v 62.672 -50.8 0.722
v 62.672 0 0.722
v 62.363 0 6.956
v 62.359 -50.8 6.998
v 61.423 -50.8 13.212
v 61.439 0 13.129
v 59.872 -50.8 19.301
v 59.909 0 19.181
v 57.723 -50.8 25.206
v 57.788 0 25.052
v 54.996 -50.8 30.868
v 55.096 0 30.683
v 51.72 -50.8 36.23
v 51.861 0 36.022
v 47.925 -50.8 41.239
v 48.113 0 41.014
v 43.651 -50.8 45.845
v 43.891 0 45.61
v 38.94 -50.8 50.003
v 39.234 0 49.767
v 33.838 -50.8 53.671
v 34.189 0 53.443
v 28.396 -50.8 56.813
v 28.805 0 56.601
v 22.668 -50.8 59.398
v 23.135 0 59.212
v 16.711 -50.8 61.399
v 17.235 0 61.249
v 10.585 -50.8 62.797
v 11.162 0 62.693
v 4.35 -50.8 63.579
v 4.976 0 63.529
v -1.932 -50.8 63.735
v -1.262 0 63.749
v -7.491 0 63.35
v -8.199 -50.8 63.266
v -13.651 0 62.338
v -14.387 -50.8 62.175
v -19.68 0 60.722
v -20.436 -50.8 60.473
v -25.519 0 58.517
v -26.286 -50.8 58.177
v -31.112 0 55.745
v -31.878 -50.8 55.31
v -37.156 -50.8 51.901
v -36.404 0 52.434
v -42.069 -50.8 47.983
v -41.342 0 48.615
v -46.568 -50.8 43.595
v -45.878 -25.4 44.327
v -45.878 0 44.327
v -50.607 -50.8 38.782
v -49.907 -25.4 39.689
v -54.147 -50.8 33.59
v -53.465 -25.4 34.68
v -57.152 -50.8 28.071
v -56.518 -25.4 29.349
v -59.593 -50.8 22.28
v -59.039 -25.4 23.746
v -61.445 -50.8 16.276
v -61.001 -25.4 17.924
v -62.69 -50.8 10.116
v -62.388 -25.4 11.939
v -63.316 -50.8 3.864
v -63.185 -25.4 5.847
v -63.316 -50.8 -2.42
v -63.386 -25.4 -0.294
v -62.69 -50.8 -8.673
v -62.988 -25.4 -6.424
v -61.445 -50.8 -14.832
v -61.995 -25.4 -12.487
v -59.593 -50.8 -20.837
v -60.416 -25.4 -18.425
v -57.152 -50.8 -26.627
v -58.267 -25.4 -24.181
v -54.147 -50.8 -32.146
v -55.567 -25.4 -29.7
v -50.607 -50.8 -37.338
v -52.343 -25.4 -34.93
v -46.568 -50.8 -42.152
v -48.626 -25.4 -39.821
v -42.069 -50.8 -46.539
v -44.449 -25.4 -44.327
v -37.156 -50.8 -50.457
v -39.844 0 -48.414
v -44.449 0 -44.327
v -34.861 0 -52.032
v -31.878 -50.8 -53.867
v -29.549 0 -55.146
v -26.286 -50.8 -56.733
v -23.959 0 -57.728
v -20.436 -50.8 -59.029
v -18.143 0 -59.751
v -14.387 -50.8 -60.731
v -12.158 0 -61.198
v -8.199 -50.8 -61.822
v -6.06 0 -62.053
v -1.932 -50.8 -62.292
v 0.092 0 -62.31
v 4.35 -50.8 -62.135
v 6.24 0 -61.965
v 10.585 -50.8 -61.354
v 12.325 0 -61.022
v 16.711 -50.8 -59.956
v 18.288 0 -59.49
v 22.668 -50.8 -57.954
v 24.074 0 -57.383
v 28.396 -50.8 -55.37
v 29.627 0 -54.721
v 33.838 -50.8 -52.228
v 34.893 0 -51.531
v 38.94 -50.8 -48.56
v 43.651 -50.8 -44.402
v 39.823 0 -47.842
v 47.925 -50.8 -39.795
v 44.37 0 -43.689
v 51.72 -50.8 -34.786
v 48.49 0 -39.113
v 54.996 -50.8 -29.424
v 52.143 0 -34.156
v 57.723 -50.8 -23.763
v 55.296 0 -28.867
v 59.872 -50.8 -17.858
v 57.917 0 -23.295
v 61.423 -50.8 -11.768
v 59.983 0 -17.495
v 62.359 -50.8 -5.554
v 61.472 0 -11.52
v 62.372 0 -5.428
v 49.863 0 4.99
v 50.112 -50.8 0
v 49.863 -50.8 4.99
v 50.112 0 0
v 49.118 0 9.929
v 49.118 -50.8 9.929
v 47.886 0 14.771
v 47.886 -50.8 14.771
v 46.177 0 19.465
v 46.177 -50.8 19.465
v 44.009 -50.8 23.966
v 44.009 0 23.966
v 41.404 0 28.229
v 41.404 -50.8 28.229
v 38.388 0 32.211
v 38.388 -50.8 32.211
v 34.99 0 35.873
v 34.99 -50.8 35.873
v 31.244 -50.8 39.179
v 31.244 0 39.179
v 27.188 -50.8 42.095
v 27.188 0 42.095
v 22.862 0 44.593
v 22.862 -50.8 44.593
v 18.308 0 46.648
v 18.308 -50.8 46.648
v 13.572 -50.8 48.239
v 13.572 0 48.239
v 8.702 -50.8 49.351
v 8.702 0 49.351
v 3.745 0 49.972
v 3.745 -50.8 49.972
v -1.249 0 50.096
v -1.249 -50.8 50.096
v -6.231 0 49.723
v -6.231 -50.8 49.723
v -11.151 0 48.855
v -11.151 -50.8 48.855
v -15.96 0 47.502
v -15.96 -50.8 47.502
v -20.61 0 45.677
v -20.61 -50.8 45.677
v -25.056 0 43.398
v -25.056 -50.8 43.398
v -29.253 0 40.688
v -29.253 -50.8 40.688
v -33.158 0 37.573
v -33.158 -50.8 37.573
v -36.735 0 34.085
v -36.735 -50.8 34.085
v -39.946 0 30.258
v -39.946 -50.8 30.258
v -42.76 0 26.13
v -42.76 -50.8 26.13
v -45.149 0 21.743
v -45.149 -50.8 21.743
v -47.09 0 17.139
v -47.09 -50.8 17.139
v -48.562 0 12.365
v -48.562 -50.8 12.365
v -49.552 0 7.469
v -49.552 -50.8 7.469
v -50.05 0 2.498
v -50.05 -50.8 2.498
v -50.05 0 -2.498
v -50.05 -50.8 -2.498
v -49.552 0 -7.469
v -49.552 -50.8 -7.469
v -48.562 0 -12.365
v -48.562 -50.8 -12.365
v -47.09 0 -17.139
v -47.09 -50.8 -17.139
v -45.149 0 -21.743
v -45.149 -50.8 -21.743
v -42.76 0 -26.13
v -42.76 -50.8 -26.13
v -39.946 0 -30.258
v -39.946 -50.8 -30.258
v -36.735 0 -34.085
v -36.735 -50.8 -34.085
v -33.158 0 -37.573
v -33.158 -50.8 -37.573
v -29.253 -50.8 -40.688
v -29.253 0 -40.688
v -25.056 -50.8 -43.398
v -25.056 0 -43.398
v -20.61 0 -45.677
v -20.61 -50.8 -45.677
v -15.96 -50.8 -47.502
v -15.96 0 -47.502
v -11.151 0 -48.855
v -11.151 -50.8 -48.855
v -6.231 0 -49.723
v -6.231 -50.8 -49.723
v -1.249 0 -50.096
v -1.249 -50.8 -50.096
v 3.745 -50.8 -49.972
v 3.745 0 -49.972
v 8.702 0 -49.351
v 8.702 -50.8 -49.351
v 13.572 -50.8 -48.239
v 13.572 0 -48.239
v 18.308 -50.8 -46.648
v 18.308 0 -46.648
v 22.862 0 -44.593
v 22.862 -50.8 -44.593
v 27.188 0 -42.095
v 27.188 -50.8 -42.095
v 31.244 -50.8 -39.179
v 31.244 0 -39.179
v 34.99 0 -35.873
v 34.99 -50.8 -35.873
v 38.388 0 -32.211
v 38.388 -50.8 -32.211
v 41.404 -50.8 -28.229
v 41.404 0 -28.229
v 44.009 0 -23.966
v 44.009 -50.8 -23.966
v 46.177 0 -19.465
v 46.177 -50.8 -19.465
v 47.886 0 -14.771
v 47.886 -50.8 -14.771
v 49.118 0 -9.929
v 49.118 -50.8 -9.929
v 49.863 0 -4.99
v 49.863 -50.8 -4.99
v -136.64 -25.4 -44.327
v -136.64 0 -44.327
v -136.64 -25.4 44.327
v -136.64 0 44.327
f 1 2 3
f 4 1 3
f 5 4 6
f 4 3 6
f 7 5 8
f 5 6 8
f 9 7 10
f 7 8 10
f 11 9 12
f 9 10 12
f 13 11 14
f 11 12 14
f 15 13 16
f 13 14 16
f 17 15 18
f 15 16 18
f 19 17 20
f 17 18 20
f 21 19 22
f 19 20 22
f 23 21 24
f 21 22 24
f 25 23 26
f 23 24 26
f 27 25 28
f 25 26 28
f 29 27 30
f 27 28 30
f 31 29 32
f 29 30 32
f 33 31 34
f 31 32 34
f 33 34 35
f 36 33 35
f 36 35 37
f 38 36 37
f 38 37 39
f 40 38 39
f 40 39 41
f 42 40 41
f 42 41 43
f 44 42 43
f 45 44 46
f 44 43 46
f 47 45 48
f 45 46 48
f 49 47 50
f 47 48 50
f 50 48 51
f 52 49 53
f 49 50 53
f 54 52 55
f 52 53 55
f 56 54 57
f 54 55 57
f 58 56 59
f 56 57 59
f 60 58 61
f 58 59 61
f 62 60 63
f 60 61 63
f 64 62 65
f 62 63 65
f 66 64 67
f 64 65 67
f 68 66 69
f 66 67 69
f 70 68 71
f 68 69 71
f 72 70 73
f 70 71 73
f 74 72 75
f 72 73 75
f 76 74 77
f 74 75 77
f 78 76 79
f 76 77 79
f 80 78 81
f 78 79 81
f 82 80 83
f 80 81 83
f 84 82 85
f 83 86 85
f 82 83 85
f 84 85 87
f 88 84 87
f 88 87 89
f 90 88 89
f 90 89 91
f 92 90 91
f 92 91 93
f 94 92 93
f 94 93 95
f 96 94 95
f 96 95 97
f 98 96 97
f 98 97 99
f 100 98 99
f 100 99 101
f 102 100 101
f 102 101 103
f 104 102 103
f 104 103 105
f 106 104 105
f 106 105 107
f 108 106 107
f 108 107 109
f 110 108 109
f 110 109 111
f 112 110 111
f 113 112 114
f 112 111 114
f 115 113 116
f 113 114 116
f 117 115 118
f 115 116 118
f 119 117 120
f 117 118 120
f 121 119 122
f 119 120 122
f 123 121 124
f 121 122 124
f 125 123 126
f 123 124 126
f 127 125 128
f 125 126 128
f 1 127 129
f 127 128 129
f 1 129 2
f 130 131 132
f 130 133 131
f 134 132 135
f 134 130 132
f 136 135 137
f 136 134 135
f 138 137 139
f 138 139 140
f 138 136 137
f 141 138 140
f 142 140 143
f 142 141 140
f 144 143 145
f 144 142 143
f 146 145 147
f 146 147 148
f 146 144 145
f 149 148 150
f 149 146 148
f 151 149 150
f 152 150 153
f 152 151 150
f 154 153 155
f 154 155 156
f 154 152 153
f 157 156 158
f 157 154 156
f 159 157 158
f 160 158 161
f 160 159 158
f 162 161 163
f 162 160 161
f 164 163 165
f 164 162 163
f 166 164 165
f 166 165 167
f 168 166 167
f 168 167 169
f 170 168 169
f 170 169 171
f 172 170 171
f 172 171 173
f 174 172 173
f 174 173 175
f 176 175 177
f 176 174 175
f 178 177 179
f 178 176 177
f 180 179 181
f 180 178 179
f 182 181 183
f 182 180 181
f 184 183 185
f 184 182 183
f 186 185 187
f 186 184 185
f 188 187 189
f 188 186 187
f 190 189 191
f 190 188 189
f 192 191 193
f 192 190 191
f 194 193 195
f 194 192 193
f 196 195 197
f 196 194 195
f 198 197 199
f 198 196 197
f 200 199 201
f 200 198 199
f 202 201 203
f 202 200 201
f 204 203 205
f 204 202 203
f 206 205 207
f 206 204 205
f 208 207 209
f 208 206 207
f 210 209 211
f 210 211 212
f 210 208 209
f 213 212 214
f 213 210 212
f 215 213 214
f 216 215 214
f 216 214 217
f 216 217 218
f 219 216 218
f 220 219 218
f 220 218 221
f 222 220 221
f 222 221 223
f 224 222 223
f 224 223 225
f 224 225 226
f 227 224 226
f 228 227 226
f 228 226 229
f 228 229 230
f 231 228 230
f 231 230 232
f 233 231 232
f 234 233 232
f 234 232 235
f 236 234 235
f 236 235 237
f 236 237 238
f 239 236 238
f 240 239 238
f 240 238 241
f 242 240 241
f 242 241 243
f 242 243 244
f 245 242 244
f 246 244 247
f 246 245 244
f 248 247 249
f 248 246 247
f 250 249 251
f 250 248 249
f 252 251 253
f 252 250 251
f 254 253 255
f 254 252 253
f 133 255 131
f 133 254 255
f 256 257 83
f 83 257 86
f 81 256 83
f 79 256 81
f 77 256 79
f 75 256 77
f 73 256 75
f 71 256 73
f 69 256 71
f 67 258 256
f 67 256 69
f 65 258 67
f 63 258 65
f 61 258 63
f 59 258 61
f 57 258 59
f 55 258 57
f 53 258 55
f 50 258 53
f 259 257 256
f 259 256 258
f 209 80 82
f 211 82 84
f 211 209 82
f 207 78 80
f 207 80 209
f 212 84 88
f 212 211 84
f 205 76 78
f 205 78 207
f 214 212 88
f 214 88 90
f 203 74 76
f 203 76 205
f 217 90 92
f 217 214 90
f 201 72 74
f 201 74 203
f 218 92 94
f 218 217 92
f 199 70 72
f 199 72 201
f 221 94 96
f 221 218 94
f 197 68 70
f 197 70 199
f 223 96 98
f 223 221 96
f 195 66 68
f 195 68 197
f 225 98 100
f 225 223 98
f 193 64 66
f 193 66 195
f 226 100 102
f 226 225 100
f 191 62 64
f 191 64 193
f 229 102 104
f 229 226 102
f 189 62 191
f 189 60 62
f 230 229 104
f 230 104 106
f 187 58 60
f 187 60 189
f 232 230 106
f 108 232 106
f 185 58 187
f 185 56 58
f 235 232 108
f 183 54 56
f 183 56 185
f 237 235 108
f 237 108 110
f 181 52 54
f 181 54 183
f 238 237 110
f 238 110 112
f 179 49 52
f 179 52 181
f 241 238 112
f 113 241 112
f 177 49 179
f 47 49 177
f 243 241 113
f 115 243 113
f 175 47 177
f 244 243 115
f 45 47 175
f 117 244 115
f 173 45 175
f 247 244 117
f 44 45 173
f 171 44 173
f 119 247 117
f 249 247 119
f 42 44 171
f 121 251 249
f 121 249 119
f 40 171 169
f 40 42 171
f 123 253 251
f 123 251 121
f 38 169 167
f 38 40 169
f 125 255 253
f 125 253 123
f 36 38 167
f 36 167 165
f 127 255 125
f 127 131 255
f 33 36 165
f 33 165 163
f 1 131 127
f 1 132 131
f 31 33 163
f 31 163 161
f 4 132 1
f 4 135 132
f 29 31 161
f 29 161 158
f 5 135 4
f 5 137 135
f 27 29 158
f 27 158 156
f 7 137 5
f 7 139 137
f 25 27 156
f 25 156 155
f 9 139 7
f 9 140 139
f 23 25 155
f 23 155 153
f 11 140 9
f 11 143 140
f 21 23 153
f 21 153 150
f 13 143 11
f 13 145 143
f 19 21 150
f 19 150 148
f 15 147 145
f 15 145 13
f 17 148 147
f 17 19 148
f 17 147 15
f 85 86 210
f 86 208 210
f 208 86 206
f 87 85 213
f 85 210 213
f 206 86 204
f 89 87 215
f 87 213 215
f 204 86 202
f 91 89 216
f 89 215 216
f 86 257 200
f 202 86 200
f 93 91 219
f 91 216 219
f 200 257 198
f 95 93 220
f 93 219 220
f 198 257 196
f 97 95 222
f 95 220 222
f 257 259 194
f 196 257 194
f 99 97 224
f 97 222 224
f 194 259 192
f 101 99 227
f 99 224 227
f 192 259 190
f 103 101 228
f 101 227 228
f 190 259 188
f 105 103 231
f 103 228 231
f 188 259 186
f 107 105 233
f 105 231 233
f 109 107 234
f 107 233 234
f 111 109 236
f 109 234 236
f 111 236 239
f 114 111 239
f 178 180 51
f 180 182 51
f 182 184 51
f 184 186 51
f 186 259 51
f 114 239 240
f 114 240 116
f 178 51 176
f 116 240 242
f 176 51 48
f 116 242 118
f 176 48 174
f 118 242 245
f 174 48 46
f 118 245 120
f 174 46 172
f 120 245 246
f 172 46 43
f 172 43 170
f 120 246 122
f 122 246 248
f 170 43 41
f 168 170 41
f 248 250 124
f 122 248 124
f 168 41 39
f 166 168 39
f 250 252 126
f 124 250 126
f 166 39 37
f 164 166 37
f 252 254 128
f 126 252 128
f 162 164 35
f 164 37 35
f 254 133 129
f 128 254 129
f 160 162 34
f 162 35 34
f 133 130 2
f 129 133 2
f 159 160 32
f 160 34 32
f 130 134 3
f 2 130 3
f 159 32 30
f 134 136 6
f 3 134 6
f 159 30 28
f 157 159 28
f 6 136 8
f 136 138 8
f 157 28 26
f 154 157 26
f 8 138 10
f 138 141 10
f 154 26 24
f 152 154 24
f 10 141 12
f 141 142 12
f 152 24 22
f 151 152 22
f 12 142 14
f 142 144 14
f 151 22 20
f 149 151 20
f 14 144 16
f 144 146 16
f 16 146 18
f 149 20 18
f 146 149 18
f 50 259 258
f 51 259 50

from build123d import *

# Parameters (mm, degrees)
F0_R     = 63.0332735131
F0_R_2   = 50.1119097805
F1_DEPTH = 25.4
F2_DEPTH = 25.4
F3_W     = 148.2297182083
F3_H     = 88.6540859938
F4_DEPTH = 25.4
F5_DEPTH = 25.4


with BuildPart() as f1:
    # F0 (on Front) → F1 (new body)
    with BuildSketch(Plane.XZ):
        with Locations((-0.360891223, 0.7217377424)):
            Circle(F0_R)
        Circle(F0_R_2, mode=Mode.SUBTRACT)
    extrude(amount=F1_DEPTH)

    # F2 (add): a face of the model
    f2_faces = [f1.faces().sort_by_distance(p)[0] for p in [
        (-61.6113145304, -25.4, 0.7217377424),
    ]]
    extrude(f2_faces, amount=F2_DEPTH)

    # F3 (on Front) → F4 (join)
    with BuildSketch(Plane.XZ):
        with Locations((-62.5252425671, 0)):
            Rectangle(F3_W, F3_H)
    extrude(amount=F4_DEPTH)

    # F5 (cut): a face of the model
    f5_faces = [f1.faces().sort_by_distance(p)[0] for p in [
        (-15.9361897378, -25.4, 0),
    ]]
    extrude(f5_faces, amount=-F5_DEPTH, mode=Mode.SUBTRACT)


solid = f1.part
